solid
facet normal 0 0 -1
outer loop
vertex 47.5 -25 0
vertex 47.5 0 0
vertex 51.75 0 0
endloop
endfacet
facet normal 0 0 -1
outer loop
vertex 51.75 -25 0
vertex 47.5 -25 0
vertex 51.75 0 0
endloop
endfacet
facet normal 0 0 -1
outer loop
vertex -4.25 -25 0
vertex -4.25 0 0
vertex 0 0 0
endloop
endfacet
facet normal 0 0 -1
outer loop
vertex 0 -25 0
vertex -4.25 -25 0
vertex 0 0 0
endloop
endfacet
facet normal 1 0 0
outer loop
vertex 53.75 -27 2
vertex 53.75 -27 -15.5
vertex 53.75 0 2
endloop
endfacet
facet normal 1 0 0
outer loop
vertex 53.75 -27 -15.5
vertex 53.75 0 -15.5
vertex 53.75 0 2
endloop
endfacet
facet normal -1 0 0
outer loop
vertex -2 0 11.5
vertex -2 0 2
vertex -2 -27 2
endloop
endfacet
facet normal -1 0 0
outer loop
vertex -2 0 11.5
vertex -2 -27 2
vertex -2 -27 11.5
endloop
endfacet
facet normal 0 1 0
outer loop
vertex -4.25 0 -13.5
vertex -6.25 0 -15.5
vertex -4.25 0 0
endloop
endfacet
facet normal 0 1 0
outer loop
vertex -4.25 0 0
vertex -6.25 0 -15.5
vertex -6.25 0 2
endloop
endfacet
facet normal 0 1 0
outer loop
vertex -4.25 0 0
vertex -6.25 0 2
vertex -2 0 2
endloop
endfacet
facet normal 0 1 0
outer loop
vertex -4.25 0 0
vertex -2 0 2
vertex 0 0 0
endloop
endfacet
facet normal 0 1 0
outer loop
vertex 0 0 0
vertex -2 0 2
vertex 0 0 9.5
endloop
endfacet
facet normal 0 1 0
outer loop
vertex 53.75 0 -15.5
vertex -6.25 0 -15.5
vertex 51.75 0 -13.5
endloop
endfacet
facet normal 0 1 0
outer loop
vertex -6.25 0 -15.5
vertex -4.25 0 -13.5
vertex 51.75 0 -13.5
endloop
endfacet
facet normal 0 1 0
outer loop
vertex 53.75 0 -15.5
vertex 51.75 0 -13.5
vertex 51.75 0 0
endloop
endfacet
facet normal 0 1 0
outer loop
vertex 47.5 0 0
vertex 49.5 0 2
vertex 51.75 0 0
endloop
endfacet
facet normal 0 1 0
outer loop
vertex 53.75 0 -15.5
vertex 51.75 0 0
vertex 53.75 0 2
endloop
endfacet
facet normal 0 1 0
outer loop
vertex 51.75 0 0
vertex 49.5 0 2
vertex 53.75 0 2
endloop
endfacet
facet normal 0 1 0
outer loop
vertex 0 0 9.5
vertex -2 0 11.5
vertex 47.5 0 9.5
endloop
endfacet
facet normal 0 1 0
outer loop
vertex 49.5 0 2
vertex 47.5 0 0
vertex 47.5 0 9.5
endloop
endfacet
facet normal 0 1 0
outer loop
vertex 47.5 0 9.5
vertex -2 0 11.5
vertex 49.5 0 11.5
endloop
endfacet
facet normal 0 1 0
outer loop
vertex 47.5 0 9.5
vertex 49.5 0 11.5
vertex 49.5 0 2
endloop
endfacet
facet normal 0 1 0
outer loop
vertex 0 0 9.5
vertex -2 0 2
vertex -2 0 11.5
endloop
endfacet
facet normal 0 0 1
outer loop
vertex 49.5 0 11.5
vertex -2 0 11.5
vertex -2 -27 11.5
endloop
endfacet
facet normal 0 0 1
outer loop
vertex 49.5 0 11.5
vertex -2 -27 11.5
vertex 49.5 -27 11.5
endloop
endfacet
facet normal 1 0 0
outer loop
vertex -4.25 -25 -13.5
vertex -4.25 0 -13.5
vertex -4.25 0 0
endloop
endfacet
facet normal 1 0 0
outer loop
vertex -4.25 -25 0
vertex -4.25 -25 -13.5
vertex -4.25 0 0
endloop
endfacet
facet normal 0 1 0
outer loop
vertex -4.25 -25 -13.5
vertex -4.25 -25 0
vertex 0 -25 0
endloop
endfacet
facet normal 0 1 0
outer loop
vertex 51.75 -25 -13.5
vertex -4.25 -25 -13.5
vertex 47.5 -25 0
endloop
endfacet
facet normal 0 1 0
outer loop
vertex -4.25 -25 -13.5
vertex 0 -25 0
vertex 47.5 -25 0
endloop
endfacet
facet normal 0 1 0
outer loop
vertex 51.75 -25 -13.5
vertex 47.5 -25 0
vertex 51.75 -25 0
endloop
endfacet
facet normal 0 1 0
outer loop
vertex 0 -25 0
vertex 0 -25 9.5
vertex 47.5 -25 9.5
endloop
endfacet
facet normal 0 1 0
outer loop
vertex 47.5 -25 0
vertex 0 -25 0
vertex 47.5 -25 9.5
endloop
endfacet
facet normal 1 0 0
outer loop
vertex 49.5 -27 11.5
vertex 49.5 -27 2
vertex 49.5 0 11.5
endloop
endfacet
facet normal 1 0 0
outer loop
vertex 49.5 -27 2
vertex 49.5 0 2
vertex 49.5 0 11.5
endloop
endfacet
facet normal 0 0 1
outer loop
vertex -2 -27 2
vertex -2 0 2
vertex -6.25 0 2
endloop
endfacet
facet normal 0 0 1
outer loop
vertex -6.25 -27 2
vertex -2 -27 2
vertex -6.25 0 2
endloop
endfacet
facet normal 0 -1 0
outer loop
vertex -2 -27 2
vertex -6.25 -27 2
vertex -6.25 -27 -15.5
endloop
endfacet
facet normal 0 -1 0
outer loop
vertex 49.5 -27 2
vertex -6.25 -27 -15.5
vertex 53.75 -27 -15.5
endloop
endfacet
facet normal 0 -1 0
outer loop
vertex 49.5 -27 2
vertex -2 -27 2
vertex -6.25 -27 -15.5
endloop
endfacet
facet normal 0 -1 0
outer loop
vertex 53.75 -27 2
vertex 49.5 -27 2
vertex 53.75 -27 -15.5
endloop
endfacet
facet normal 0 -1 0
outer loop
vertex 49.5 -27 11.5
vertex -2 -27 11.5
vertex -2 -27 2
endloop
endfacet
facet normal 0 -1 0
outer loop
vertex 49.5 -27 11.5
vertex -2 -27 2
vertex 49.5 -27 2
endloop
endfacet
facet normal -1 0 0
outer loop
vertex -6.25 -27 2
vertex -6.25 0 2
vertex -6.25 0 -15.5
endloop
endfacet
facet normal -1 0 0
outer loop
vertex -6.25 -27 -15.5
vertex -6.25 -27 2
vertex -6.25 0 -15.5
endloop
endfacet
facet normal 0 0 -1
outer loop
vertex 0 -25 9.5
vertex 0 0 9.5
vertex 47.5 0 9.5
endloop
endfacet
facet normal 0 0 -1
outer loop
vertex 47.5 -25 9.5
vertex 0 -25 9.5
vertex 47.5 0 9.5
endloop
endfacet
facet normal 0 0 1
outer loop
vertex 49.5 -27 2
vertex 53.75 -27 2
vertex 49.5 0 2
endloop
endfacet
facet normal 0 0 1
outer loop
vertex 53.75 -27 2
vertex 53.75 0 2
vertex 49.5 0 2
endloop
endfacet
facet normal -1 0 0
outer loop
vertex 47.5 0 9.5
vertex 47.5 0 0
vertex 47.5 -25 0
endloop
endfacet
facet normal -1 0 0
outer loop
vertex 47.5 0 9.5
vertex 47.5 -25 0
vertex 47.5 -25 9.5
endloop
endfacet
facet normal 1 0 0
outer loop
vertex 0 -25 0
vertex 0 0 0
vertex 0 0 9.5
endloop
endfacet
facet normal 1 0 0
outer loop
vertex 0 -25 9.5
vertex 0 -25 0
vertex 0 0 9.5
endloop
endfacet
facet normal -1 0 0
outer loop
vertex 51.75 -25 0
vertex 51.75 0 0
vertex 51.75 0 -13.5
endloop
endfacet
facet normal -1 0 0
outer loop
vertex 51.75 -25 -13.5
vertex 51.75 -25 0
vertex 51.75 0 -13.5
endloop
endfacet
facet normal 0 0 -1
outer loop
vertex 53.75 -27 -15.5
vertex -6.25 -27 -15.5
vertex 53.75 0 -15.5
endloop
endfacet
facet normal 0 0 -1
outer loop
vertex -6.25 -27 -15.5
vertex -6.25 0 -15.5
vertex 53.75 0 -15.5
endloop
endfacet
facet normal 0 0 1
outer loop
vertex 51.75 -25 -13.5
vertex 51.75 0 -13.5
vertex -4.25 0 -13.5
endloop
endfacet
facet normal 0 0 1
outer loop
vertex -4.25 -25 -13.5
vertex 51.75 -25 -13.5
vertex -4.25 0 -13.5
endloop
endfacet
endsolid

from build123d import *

# Parameters (mm, degrees)
F0_W     = 47.5
F0_H     = 2
F0_W_2   = 2
F0_W_3   = 2.25
F0_H_2   = 13.5
F0_W_4   = 56
F0_H_3   = 9.5
F1_DEPTH = 25
F2_W     = 6.25
F2_H     = 2
F3_DEPTH = 25
F4_W     = 51.5
F4_H     = 9.5
F5_DEPTH = 2


with BuildPart() as f1:
    # F0 (on Front) → F1 (new body)
    with BuildSketch(Plane.XZ):
        with Locations((23.75, 10.5)):
            Rectangle(F0_W, F0_H)
        with Locations((-1, 10.5)):
            Rectangle(F0_W_2, F0_H)
        Polygon((-2, 0), (0, 0), (0, 9.5), (-2, 9.5), (-2, 2), align=None)
        with Locations((-3.125, 1)):
            Rectangle(F0_W_3, F0_H)
        with Locations((-5.25, 1)):
            Rectangle(F0_W_2, F0_H)
        with Locations((-5.25, -6.75)):
            Rectangle(F0_W_2, F0_H_2)
        with Locations((-5.25, -14.5)):
            Rectangle(F0_W_2, F0_H)
        with Locations((23.75, -14.5)):
            Rectangle(F0_W_4, F0_H)
        with Locations((52.75, -14.5)):
            Rectangle(F0_W_2, F0_H)
        with Locations((52.75, -6.75)):
            Rectangle(F0_W_2, F0_H_2)
        with Locations((52.75, 1)):
            Rectangle(F0_W_2, F0_H)
        with Locations((48.5, 4.75)):
            Rectangle(F0_W_2, F0_H_3)
        with Locations((48.5, 10.5)):
            Rectangle(F0_W_2, F0_H)
    extrude(amount=F1_DEPTH)

    # F2 (on face) → F3 (join)
    with BuildSketch(Plane.XZ.offset(25)):
        with Locations((50.625, 1)):
            Rectangle(F2_W, F2_H)
    extrude(amount=-F3_DEPTH)

    # F4 (on face) → F5 (join)
    with BuildSketch(Plane.XZ.offset(25)):
        Polygon((-6.25, 2), (-6.25, -15.5), (53.75, -15.5), (53.75, 2), (49.5, 2), (-2, 2), align=None)
        with Locations((23.75, 6.75)):
            Rectangle(F4_W, F4_H)
    extrude(amount=F5_DEPTH)


solid = f1.part
